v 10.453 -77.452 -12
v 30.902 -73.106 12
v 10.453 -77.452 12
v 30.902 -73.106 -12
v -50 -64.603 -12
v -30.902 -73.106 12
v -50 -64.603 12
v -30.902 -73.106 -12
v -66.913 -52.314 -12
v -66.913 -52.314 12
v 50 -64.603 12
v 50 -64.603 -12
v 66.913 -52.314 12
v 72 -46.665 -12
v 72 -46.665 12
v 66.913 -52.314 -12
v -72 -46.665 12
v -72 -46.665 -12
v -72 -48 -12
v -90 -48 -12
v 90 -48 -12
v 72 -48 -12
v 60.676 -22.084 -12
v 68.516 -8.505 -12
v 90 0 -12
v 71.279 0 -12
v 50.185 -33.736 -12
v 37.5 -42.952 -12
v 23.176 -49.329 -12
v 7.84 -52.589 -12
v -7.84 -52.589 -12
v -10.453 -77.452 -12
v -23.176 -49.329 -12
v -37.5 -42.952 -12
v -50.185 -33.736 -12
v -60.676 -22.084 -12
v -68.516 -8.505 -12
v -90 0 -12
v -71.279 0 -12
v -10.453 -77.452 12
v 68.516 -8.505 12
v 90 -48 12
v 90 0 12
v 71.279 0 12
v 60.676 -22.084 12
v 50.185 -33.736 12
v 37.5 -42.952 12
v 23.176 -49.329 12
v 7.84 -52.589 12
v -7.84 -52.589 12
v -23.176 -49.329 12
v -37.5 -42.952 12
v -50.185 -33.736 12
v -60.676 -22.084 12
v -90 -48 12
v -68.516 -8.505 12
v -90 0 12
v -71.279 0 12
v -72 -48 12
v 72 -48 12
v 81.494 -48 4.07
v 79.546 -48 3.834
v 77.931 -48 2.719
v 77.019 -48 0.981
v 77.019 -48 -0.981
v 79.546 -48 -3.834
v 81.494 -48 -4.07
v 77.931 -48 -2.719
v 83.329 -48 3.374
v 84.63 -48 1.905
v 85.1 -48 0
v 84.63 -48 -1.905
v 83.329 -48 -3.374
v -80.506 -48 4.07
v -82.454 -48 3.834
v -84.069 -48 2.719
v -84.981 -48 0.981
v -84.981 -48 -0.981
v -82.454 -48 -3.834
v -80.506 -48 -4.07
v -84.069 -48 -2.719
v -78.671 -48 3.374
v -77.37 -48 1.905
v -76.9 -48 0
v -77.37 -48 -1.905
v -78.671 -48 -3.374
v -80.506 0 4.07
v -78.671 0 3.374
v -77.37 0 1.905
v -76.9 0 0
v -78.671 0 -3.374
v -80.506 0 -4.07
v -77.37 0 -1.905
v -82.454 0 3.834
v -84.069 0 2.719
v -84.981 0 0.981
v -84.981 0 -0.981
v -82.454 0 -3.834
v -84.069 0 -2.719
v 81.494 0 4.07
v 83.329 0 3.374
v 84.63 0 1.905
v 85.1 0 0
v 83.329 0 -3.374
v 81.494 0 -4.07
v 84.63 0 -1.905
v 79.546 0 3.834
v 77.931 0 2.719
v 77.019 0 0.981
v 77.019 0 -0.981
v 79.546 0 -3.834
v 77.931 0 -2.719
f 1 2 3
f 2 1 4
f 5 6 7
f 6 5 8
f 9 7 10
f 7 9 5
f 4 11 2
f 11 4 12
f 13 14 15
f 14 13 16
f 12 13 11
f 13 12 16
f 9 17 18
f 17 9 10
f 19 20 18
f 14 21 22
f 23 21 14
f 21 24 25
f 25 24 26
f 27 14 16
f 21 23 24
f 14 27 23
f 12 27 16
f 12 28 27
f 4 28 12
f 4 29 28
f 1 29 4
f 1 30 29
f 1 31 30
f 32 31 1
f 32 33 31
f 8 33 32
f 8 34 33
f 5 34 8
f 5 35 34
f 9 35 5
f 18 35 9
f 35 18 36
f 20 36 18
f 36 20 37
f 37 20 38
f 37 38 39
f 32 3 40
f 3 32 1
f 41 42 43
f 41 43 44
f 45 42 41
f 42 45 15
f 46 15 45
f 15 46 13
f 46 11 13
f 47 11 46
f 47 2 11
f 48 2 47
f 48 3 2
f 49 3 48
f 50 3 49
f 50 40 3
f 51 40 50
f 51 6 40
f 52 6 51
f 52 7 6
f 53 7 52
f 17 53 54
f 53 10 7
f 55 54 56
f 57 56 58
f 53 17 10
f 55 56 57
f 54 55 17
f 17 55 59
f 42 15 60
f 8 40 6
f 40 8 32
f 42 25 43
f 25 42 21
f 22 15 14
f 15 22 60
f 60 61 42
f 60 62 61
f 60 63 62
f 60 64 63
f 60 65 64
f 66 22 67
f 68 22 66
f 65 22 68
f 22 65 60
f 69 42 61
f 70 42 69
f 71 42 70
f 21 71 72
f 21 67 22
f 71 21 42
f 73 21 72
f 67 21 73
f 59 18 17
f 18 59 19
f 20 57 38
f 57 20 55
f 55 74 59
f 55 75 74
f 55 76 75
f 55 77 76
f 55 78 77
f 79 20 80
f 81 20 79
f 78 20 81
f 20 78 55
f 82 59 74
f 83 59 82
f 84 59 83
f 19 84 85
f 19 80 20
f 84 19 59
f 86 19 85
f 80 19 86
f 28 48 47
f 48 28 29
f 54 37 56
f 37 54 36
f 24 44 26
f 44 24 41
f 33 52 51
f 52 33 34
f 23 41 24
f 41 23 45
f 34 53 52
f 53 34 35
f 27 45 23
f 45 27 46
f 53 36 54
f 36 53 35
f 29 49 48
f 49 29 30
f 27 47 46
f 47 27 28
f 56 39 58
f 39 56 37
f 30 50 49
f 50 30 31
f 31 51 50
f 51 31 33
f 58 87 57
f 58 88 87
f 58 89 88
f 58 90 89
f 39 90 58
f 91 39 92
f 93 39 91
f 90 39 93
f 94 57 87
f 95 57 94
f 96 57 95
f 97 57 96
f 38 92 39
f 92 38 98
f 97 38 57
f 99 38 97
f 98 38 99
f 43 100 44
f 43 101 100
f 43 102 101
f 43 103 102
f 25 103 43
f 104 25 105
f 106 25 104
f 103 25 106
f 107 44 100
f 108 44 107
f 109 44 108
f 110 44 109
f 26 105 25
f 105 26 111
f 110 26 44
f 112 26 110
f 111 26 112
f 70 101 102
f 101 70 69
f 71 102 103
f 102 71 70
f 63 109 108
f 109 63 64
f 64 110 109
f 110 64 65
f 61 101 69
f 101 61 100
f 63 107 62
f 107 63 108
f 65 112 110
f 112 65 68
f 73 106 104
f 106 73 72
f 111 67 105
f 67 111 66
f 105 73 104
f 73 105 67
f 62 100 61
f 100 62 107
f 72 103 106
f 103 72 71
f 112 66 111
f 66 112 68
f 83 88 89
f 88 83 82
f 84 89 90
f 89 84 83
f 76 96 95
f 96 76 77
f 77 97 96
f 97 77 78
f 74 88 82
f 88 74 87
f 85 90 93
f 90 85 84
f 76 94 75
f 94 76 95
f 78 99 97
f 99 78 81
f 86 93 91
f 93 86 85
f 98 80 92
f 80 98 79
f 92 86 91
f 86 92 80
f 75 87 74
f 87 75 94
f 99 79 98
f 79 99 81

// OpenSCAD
difference() {
	union() {
		translate([0,22,0])
		cylinder(h = 24, r1 = 100, r2 = 100, center = true);
	
		translate([81,-24,0])
		cube([18,48,24], center = true);

		translate([-81,-24,0])
		cube([18,48,24], center = true);

	}
	translate([0,22,0])
	cylinder(h = 200, r1 = 75, r2 = 75, center = true);
	translate([0,70,0])
	cube([200, 140, 100], center = true);

	translate([100,-30,-30])
	cube([20,60,200], center = true);

	translate([-100,-30,-30])
	cube([20,60,200], center = true);

	translate([81,0,0])
	rotate(90,[1,0,0])
	cylinder(h = 200, r1 = 4.1, r2 = 4.1, center = true);
	translate([-81,0,0])
	rotate(90,[1,0,0])
	cylinder(h = 200, r1 = 4.1, r2 = 4.1, center = true);
}
